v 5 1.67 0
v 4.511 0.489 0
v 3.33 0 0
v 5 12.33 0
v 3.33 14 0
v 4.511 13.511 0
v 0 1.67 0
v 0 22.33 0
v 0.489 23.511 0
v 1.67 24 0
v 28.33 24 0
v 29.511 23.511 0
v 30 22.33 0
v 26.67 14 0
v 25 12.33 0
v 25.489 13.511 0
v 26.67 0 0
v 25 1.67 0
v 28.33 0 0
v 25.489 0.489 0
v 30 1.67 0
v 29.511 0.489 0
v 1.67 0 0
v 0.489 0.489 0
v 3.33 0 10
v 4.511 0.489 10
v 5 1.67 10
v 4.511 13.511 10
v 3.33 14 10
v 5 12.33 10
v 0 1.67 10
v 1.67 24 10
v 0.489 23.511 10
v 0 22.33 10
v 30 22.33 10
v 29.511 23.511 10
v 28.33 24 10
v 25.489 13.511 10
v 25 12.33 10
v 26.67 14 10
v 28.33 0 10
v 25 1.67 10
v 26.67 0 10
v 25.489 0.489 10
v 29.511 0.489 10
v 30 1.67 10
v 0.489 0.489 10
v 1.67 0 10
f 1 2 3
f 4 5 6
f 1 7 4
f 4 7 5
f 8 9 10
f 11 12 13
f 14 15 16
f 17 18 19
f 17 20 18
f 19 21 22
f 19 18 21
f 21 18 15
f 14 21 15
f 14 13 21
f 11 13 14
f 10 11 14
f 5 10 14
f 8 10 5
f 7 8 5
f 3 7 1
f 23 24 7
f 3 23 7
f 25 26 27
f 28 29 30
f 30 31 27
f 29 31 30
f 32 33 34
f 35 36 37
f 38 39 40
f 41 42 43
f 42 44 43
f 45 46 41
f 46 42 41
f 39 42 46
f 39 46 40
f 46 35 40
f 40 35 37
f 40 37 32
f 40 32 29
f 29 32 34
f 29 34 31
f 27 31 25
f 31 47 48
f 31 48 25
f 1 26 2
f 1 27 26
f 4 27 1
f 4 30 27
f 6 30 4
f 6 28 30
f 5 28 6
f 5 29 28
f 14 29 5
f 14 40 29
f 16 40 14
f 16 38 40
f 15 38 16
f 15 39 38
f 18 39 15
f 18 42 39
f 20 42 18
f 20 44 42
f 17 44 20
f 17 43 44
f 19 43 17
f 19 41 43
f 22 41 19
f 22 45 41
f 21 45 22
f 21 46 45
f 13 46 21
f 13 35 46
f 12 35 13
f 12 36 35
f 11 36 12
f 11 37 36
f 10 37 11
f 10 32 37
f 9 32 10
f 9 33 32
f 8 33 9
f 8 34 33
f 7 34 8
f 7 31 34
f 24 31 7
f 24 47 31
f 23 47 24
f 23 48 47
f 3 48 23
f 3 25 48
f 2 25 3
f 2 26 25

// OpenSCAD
$fn = 32;

// ----------------------------------------------------------------------
// Clip blank: staple clip, 10 mm thick
// ----------------------------------------------------------------------

// --- parameters (mm) ---
profile_height = 10;      // extrusion height
profile_points = 24;      // points of the closed outline

profile = [[0, 1.67], [0.489, 0.489], [1.67, 0], [3.33, 0], [4.511, 0.489], [5, 1.67], [5, 12.33], [4.511, 13.511], [3.33, 14], [26.67, 14], [25.489, 13.511], [25, 12.33], [25, 1.67], [25.489, 0.489], [26.67, 0], [28.33, 0], [29.511, 0.489], [30, 1.67], [30, 22.33], [29.511, 23.511], [28.33, 24], [1.67, 24], [0.489, 23.511], [0, 22.33]];  // single closed polygon, 24 points, counter clockwise

// --- the one profile operation ---
linear_extrude(height = profile_height) polygon(points = profile);
